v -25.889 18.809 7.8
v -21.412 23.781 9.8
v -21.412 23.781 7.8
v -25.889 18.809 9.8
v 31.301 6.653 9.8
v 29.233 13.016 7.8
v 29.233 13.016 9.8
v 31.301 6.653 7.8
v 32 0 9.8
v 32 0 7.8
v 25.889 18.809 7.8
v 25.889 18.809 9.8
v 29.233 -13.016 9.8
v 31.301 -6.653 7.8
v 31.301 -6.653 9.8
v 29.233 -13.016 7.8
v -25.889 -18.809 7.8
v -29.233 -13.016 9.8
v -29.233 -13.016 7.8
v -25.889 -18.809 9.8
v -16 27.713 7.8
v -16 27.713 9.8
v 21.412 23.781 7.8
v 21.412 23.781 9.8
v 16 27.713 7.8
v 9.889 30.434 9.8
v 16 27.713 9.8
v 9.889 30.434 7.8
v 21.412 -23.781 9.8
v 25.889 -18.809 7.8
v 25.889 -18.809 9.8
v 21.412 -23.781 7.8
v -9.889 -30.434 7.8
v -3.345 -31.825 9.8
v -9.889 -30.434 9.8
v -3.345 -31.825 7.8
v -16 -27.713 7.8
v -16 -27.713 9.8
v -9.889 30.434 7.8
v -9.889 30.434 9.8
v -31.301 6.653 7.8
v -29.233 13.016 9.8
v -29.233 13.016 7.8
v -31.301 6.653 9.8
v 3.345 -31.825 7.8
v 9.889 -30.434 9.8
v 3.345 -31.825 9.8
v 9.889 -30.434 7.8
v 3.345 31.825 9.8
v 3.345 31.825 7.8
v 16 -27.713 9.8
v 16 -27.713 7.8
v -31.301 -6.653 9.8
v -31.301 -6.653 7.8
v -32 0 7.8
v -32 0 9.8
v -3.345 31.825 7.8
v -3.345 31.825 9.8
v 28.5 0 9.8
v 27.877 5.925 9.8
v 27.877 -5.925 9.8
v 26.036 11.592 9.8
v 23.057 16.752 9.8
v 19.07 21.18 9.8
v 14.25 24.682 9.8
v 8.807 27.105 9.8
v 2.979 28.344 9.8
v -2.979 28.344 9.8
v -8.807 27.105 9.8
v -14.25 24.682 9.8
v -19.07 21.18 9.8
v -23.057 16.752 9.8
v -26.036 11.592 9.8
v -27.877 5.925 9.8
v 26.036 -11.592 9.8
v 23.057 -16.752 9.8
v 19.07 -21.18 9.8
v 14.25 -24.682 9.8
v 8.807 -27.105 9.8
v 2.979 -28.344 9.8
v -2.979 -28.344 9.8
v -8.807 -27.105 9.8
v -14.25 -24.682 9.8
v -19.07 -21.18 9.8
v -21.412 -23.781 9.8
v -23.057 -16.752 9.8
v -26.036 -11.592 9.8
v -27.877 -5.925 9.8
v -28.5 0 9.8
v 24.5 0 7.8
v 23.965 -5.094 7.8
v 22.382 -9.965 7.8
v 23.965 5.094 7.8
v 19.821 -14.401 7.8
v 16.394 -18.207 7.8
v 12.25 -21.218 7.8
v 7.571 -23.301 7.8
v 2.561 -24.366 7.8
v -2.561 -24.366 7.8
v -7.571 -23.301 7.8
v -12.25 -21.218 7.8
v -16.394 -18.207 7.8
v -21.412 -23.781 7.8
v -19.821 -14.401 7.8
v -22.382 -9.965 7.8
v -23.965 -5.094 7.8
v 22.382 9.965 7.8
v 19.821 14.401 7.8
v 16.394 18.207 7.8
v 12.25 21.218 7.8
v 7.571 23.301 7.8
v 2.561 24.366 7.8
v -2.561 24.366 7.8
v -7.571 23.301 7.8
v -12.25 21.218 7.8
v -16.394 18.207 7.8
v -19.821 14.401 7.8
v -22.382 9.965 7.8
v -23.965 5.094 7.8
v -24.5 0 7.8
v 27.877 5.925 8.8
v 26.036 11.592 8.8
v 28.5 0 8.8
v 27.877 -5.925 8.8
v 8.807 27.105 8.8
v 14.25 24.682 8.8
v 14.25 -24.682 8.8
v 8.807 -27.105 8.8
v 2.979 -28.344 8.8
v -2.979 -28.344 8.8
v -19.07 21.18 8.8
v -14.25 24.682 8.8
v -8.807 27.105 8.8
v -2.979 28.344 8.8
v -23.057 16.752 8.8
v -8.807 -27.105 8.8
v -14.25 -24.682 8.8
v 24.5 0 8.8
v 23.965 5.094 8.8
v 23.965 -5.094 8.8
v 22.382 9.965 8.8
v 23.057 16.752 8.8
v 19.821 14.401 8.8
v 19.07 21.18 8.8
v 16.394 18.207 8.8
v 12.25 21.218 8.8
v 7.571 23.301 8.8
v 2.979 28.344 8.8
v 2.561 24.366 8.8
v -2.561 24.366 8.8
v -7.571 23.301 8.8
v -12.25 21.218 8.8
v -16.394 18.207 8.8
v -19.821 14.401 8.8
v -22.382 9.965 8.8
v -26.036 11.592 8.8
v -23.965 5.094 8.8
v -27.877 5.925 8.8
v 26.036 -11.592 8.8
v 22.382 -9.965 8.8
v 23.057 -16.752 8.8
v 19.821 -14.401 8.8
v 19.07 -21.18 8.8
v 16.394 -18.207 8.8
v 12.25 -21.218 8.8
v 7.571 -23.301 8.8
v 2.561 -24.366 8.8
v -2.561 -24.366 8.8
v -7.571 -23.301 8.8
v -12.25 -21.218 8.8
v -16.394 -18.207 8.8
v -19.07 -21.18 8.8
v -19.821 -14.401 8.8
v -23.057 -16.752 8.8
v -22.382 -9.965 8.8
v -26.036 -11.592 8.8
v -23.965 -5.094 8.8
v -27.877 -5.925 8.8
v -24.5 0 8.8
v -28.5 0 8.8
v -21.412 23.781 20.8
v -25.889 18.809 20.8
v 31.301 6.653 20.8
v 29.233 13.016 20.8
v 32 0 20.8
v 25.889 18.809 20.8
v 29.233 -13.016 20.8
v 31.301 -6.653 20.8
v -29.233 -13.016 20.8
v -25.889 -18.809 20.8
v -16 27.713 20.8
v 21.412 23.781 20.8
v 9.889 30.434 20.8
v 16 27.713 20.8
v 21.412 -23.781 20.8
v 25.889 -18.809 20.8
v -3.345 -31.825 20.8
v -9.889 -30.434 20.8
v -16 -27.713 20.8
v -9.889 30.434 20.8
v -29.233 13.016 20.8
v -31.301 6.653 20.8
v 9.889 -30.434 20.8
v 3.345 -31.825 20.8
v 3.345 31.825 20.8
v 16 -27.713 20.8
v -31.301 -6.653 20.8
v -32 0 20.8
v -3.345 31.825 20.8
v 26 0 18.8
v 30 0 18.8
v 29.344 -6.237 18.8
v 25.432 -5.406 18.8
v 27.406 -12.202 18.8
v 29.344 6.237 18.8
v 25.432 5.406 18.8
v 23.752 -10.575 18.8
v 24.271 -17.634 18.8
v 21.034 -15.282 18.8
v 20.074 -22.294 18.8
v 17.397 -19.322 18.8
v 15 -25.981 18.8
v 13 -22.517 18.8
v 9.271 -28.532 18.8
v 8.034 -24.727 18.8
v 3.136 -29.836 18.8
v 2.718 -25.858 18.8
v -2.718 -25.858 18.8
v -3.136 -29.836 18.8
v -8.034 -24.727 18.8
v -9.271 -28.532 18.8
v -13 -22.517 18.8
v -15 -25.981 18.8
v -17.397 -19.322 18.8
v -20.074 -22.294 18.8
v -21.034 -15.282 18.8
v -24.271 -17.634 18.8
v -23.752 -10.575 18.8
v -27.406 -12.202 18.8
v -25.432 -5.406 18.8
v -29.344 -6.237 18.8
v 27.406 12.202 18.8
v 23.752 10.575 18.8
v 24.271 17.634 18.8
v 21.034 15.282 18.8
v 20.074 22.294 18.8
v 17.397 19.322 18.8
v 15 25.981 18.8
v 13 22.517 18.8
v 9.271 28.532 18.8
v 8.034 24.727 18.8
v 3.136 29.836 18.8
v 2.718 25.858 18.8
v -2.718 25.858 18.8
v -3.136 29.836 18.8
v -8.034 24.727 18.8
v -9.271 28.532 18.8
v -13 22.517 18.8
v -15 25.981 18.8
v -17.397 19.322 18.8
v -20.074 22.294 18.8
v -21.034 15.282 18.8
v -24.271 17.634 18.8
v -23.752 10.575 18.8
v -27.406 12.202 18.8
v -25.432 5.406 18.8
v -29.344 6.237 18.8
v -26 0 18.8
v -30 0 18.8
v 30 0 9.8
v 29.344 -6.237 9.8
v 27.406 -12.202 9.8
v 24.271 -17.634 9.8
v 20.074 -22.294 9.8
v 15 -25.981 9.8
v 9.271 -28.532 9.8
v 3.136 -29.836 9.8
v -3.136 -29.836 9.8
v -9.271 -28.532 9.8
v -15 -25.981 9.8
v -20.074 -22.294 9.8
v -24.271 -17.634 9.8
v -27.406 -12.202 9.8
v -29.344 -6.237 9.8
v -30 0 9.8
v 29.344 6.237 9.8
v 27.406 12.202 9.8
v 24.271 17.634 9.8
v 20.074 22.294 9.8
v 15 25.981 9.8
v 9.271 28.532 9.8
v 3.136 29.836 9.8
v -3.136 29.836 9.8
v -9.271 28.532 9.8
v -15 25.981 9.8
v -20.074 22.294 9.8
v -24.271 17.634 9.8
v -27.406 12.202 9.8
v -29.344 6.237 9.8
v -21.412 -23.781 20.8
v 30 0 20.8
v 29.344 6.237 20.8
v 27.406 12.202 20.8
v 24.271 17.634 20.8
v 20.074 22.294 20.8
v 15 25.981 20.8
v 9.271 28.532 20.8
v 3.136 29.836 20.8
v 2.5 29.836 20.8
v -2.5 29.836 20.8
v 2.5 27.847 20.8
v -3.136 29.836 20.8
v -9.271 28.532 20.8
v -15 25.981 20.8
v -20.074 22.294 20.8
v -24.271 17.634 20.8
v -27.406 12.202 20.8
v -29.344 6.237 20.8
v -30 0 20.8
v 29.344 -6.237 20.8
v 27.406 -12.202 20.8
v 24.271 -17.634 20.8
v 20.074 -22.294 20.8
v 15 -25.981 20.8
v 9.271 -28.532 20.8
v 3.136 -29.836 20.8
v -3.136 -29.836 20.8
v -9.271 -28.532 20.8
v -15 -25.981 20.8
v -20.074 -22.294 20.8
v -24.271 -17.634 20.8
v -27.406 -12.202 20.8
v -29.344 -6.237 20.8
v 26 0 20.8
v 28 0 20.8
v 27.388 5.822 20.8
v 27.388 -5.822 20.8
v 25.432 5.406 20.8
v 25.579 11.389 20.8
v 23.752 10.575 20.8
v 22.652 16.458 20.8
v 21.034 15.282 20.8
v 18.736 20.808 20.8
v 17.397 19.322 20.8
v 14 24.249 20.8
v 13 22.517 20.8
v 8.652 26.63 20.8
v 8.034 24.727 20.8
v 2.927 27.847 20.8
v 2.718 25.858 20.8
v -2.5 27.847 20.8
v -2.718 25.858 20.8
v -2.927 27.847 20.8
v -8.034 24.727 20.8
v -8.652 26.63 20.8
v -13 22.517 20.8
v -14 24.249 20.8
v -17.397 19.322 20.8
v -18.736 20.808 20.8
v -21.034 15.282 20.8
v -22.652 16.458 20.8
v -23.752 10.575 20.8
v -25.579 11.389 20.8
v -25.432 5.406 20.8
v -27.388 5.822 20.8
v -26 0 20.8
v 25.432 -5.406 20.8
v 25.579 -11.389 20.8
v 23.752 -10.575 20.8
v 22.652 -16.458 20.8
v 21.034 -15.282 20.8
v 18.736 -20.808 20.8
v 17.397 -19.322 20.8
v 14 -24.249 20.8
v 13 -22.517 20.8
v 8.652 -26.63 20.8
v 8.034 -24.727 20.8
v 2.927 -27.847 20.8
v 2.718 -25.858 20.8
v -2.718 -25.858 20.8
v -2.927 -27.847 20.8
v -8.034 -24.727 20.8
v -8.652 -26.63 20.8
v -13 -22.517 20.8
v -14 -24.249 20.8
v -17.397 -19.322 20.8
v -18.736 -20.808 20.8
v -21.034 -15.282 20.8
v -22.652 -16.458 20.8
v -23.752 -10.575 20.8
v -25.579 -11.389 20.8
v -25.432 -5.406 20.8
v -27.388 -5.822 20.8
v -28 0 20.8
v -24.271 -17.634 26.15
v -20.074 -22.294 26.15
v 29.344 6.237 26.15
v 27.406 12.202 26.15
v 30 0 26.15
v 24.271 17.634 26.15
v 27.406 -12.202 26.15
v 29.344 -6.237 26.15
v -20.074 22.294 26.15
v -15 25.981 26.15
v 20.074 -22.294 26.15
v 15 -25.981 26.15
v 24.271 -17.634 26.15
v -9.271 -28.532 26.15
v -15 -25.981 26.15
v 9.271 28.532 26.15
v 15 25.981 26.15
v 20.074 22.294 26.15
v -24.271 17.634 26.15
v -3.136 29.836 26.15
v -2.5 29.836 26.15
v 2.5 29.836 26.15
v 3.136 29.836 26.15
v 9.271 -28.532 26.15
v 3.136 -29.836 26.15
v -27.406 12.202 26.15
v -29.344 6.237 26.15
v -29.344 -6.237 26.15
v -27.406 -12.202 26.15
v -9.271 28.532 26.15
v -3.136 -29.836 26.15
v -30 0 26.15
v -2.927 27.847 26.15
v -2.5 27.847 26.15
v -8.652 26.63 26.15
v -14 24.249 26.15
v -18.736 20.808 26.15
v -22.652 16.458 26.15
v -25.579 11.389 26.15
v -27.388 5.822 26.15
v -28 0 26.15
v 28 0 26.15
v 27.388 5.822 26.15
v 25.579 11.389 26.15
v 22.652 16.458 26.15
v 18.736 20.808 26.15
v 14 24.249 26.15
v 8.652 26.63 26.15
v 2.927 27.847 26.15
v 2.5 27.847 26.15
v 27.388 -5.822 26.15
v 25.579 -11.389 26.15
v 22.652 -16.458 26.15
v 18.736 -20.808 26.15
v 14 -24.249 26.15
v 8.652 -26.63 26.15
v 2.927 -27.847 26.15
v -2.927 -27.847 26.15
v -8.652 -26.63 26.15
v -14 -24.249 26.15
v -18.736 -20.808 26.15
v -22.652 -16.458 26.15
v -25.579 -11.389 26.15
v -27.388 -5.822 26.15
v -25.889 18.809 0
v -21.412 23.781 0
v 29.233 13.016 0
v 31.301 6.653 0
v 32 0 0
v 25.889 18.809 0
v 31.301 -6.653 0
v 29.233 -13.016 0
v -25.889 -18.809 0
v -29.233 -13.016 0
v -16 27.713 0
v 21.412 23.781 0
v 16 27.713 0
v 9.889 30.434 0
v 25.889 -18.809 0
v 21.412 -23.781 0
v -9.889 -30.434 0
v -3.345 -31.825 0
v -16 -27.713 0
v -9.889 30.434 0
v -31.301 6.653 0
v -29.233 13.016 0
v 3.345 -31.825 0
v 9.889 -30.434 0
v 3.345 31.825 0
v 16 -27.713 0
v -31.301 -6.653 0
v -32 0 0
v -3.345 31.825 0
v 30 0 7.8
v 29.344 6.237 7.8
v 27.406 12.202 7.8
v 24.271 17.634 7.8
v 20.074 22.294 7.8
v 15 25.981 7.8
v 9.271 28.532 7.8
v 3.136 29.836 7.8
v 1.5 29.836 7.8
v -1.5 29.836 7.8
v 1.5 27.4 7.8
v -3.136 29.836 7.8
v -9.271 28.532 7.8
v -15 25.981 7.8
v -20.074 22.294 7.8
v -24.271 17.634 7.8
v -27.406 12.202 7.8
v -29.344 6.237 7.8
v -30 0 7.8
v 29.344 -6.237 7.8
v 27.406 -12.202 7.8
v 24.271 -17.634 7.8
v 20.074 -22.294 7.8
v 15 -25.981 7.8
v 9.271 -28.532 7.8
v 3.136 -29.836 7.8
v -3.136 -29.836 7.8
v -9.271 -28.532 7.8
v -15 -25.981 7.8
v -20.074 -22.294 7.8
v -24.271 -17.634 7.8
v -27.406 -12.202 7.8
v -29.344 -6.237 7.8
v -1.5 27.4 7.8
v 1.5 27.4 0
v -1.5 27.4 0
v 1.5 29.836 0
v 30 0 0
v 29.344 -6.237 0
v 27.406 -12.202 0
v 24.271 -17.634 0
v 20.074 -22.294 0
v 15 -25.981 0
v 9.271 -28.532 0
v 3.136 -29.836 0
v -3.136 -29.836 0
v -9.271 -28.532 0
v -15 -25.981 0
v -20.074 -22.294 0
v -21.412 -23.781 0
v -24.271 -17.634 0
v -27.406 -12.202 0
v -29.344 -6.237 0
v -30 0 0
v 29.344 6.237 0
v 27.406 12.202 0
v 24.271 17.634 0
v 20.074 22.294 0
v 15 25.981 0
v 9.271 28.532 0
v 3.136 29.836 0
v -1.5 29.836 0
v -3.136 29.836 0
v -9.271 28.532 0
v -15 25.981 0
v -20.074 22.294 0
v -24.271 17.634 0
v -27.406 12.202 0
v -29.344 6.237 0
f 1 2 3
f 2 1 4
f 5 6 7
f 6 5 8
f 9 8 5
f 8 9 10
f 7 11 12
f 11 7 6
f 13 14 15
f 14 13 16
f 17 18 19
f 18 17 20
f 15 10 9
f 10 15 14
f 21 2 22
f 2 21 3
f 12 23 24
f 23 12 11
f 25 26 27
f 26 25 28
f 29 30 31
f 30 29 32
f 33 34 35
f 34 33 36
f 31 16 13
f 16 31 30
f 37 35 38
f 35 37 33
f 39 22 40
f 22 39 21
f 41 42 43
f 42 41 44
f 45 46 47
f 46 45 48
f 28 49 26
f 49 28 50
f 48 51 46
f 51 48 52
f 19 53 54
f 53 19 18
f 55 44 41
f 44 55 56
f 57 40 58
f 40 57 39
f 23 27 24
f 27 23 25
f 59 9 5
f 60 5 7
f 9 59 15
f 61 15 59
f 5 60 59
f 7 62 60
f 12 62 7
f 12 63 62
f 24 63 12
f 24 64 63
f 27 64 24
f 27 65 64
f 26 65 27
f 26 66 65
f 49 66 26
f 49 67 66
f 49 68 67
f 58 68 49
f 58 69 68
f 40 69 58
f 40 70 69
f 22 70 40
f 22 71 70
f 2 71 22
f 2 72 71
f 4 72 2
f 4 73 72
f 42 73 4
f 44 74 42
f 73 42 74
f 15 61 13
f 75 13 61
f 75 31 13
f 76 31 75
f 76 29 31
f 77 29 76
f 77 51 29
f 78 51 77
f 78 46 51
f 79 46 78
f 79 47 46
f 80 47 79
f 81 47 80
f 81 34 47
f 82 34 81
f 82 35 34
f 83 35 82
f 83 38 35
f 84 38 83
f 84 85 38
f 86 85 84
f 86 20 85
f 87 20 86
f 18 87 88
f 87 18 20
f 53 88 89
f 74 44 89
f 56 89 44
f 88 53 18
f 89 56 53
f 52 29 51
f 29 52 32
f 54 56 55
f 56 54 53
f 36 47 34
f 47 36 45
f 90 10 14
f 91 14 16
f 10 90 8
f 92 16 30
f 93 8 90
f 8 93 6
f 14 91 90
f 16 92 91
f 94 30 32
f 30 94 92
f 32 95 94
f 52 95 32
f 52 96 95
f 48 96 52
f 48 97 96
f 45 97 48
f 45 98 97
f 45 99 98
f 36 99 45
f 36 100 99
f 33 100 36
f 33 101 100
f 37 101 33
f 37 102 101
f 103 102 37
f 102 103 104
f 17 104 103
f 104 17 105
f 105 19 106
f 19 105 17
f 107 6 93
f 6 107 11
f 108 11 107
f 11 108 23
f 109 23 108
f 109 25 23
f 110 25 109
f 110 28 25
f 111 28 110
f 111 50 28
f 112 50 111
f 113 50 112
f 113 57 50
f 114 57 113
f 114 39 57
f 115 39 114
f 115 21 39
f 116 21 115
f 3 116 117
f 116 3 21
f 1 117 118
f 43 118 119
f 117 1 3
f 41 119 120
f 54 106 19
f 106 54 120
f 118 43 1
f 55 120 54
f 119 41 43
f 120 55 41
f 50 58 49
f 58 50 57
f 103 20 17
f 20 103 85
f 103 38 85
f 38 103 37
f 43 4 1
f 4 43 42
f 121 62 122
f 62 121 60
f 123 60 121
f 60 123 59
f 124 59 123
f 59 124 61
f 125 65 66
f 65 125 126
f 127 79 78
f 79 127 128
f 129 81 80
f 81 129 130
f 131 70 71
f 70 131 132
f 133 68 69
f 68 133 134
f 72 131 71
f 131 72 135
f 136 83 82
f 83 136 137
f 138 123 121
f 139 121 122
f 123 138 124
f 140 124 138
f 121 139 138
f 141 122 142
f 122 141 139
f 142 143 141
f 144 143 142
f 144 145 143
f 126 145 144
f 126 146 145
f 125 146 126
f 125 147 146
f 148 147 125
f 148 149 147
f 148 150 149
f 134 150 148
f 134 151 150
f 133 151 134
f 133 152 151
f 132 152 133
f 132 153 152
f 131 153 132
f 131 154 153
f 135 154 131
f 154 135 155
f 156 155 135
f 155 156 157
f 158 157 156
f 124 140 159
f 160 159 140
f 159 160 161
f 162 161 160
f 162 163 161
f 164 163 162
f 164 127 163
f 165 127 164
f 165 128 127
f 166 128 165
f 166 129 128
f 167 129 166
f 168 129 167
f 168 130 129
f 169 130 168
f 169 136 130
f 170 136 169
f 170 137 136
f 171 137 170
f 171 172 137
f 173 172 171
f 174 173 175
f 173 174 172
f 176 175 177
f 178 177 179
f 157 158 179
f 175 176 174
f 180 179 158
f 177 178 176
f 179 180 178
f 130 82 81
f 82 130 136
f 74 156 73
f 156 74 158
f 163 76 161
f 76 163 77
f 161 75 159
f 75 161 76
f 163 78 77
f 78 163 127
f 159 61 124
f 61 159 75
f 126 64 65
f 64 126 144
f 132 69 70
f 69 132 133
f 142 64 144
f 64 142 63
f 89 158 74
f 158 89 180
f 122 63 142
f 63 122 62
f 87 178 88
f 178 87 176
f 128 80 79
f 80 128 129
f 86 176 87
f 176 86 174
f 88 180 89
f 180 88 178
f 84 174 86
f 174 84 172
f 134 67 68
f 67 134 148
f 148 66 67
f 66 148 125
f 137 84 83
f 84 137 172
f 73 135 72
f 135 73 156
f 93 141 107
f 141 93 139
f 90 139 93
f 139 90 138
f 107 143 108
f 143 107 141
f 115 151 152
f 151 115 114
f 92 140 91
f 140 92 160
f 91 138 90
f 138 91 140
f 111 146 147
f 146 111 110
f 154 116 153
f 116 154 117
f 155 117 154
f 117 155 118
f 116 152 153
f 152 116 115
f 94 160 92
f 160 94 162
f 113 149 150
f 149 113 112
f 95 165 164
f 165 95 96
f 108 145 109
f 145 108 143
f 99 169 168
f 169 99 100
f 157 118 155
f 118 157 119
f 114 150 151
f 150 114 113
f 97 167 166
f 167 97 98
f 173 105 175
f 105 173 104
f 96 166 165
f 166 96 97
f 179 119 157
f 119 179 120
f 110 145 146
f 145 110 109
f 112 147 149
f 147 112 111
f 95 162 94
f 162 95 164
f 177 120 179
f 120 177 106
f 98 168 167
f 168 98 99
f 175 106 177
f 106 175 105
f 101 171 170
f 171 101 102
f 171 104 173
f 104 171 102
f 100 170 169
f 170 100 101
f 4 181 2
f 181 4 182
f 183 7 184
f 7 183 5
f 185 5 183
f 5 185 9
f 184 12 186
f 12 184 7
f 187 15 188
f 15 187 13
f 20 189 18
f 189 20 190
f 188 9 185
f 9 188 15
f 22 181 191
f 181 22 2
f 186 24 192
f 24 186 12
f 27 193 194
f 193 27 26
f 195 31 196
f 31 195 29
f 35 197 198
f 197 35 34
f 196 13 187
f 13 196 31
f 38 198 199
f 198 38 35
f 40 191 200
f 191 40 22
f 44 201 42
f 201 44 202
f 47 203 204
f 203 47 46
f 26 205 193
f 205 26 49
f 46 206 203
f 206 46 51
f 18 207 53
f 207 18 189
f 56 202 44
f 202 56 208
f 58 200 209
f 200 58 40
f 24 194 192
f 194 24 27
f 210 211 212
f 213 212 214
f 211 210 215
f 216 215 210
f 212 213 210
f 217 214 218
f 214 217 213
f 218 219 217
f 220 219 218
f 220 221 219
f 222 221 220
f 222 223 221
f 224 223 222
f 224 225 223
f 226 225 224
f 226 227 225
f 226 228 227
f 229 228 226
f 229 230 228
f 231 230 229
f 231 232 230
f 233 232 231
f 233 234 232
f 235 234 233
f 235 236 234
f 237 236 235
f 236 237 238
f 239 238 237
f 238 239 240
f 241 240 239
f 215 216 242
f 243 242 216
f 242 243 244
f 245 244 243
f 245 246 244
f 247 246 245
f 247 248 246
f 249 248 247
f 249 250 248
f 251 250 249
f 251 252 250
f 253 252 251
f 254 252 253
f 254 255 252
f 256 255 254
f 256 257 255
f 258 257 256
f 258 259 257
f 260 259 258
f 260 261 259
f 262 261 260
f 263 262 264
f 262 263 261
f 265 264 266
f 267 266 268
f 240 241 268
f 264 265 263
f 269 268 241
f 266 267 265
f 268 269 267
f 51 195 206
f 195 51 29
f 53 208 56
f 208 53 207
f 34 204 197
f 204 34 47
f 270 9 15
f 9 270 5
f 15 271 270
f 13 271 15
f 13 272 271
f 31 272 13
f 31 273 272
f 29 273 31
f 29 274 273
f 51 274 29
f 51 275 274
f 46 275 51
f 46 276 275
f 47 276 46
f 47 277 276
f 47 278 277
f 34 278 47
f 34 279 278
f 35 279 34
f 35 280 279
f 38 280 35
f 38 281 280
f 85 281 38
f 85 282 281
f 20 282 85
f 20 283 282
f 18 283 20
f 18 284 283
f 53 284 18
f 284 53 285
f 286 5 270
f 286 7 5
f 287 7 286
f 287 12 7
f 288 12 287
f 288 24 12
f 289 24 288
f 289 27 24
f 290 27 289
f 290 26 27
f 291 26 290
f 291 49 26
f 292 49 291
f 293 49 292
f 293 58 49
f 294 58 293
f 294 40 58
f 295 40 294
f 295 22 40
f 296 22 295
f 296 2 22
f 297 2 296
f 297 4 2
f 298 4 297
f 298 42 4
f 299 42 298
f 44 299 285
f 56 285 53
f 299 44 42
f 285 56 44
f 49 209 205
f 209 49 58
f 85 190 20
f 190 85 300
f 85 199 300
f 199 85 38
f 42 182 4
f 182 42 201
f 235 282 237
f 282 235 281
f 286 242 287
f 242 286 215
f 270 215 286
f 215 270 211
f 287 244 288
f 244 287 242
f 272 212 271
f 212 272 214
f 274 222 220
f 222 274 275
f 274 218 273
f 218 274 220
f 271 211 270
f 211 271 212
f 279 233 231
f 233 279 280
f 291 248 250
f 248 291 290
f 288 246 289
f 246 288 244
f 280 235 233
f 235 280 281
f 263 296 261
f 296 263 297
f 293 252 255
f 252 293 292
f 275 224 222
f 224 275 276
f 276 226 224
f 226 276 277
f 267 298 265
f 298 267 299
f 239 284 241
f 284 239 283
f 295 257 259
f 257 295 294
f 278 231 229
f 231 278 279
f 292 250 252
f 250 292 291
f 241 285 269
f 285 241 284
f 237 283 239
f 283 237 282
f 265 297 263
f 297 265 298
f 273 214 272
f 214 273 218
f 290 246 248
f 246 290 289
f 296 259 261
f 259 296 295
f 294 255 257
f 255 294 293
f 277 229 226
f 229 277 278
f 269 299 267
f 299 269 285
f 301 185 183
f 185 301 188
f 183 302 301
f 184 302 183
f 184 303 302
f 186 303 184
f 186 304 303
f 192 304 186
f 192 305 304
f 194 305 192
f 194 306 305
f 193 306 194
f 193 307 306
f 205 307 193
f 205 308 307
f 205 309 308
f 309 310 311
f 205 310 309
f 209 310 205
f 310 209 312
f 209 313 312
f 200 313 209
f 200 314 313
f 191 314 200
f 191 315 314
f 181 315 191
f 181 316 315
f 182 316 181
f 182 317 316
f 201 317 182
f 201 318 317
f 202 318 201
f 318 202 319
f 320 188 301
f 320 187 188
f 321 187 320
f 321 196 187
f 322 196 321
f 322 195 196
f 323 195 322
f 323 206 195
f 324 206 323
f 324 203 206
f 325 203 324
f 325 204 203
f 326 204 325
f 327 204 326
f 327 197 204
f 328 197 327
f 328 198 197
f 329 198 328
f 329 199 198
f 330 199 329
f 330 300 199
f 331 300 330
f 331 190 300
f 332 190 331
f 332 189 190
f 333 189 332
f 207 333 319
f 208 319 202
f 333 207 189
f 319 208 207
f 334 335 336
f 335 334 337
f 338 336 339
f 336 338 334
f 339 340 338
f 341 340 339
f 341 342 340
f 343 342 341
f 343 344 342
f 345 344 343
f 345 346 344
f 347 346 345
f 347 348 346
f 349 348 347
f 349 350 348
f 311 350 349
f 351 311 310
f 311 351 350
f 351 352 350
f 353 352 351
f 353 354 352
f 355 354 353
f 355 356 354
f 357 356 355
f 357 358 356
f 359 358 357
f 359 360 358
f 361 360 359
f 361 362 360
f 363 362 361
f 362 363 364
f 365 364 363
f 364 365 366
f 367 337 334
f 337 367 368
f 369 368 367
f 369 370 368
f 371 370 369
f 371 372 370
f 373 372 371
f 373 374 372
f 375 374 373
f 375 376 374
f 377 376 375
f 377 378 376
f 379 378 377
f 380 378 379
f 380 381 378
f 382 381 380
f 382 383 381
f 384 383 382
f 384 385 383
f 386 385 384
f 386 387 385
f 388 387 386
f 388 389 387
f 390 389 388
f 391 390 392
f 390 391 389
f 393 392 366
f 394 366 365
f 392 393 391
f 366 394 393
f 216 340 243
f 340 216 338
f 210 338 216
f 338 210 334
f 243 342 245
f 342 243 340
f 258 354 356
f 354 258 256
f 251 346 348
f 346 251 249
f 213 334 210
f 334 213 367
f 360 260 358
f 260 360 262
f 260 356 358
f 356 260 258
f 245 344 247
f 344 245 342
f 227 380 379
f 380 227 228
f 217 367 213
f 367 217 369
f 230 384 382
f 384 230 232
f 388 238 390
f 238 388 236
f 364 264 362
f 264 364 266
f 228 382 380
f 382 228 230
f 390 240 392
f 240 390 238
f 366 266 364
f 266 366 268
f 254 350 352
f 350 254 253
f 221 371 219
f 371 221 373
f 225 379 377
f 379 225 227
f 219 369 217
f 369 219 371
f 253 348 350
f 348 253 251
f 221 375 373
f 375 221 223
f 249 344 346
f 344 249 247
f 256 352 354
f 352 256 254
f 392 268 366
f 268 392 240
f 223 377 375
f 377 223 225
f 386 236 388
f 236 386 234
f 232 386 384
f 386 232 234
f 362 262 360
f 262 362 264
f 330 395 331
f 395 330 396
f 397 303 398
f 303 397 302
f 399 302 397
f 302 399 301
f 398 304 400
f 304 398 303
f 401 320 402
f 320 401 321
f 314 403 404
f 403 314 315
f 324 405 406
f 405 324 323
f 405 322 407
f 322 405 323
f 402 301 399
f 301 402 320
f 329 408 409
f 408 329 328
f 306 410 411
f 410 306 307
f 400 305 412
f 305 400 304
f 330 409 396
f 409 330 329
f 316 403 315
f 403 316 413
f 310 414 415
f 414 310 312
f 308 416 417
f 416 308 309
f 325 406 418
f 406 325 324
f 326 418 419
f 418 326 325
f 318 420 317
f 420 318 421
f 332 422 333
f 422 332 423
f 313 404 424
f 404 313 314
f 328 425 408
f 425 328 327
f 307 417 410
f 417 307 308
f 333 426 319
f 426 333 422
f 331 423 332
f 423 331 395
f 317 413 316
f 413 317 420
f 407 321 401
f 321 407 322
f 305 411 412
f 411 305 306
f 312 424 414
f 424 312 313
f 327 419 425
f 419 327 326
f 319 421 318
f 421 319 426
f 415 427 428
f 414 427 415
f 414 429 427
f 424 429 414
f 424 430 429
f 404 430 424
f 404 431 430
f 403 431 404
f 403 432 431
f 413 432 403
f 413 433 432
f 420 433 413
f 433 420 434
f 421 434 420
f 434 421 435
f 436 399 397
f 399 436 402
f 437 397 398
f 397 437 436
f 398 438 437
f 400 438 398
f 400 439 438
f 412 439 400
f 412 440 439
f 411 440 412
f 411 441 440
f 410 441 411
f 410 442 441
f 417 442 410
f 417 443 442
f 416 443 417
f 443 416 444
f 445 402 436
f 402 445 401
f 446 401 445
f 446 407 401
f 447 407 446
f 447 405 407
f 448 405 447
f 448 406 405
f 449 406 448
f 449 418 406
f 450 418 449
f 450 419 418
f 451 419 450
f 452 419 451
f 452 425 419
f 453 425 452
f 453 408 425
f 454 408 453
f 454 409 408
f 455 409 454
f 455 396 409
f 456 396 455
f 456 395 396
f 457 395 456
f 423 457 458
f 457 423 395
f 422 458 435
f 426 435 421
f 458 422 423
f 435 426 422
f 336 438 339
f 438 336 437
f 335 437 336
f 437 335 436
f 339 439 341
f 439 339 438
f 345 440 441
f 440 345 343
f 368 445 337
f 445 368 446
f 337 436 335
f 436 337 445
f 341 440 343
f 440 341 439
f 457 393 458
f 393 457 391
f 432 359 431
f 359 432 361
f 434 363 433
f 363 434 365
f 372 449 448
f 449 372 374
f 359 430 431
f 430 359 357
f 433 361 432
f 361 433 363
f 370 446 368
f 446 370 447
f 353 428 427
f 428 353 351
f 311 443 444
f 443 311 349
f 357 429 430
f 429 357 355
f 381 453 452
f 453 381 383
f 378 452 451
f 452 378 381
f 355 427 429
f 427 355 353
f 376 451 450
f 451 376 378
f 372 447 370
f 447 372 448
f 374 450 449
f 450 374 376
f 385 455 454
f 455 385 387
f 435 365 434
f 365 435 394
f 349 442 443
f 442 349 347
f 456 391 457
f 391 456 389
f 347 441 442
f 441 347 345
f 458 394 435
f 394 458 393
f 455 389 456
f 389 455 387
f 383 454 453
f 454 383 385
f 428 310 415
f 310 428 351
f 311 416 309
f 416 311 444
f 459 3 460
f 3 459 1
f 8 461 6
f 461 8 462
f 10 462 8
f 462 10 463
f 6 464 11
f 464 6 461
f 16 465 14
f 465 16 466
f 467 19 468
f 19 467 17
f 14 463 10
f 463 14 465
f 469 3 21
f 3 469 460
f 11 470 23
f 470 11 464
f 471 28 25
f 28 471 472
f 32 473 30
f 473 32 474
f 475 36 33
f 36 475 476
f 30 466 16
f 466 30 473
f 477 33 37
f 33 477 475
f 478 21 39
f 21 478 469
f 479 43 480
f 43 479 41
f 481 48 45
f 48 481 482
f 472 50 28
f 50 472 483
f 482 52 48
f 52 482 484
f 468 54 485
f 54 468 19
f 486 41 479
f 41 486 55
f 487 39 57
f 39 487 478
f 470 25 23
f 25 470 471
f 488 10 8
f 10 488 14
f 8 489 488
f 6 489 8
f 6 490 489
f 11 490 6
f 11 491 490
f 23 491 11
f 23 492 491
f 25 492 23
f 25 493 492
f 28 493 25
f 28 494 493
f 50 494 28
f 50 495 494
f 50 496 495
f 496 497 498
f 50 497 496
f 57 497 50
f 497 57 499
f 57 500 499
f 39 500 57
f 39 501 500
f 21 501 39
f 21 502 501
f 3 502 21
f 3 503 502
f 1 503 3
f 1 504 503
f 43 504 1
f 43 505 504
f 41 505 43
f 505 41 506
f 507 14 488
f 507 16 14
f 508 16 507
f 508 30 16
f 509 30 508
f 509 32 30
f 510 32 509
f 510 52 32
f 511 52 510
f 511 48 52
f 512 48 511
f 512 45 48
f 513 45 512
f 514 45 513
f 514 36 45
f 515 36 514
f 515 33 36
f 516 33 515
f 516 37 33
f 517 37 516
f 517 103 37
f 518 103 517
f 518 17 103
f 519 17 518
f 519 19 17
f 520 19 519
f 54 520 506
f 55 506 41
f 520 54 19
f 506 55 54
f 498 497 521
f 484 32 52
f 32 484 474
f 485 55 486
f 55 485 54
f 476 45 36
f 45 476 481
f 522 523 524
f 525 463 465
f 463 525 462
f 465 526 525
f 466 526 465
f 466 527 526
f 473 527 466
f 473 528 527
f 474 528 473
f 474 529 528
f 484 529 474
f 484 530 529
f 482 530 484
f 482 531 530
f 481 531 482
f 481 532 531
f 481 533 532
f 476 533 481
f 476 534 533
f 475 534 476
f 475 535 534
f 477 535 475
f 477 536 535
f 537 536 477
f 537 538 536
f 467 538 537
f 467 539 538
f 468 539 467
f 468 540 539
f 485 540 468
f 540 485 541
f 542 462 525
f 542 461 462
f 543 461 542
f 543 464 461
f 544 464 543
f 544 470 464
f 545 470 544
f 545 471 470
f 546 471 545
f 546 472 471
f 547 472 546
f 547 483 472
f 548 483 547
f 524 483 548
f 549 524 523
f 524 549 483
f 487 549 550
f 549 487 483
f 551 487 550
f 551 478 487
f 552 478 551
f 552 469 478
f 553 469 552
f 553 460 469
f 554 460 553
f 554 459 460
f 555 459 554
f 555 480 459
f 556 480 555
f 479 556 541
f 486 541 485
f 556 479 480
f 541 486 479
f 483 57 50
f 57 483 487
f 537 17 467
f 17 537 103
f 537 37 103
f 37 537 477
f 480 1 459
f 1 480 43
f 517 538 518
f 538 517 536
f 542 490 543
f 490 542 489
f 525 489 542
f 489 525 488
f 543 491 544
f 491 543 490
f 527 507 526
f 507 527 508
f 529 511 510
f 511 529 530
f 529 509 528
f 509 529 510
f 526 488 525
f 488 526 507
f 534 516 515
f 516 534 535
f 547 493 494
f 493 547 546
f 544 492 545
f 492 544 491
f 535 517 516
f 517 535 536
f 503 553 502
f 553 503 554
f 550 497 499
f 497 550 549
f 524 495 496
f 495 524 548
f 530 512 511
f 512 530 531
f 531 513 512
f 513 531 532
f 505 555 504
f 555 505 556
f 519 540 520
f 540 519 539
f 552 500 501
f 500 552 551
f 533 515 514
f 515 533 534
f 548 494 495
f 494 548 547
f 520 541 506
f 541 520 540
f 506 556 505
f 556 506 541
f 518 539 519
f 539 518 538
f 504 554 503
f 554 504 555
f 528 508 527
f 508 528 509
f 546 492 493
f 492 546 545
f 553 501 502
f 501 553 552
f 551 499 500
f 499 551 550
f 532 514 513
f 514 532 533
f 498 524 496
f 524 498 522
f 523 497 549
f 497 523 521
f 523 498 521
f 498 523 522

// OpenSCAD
// file: settingsLenghts.scad
//Ancho de la pared
pared  = 2;
//Radio del centro hueco
radioC = 11;
//Alto de la capa de apertura
aperH = 5.5;
//Ancho de la apertura
aperW = 5+1.1;//Ancho mas holgura
//Ancho del lente macro
macroW = 9.3;
//Profundidad del macro
macroH = 3;
//Profundidad parte de atras y delante
profDelante = 6;
profAtras = 6;
//Ceja entre uniones de cilindros
cejaH = 6;
guiaParedW = 2;
tmpHolg = 1.8;


//Correcc

//
//CÁMARA
camP = 3;//Grueso de la pared del presente modelo
camW = 105;//Ancho de la cámara
camH = 61;//Alto de la cámara
camD = 23.5;//Profundidad de la cámara
camHlg = 6;//Holgura que se deja para los tornillos
camLW = 57/2;//Radio del exterior del lente
torW  = 2;//Radio

//
//Ancho de tubo principal (grande)
mcW = 32;//radio
mcH = 28;

//Dimensiones del difractador
diffW = 51;//Alto y Ancho
diffD=1;//Profundidad del difractador
diffWinW=36;//Ancho de la ventana de difracción
diffWinH=24;//Alto de la ventana de difracción

//
//Adquisición de luz
luzHBig = 10; //donde va el tornillo
luzWBig = 28; //27:diametro donde va el tornillo
luzHBigT = 4; //alto del tornillo
luzWBigT = 6; //6: ancho del tornillo
luzHRosca = 7; //donde va la rosca
luzWRosca = 23; //22:diametro de donde va la rosca



//Cuadro guia para que no se mueva
guiaH = cejaH;
guiaW = 3;



module creaPared(h){
	difference(){
		//Pone el cilindro principal
		cylinder(r=mcW,h);

		//Le quita el contorno exterior
		translate([0,0,-0.1])
		cylinder(r=mcW-pared,h+0.2);
	}
}
module creaGuiaTornilloCentrada(){
	translate([-luzWBigT/2,-luzWBigT/2,0])
	cube([luzWBigT,luzWBigT,luzHBig-1+0.2]);
}
module creaGuiaTornilloCentradaArea(){
	tmpW = luzWBigT + pared;
	tmpH = luzHBig  + pared;
	translate([-tmpW/2,-tmpW/2,0])
	cube([tmpW,tmpW,tmpH]);
}
module creaGuia(h){
	//Pone el circulo soporte
	difference(){
		cylinder(r=mcW,h);
		translate([0,0,-0.1])
		cylinder(r=mcW-pared,h+0.2);
	}
	//Pone la guia1
	translate([0,mcW-pared-(guiaW/2)+0.4,0])
	creaGuiaCentrada(h);
}
module creaGuiaHembra(h){
	//Pone el circulo soporte
	tmpW = mcW-guiaW;	
	creaPared(sopH);
	sopH = 1.35;
	
	//Pone la pared de la guia
	difference(){
		cylinder(r=(mcW-pared),sopH+h);
		translate([0,0,-0.1])
		cylinder(r=(mcW-pared-guiaParedW),sopH+h+0.2);
		//Pone la guia
		translate([-(guiaW/3),tmpW,sopH])
		creaGuiaCentrada(sopH+h+0.2);
		translate([(guiaW/3),tmpW,sopH])
		creaGuiaCentrada(sopH+h+0.2);
	}
}
module creaGuiaCentrada(h){
	translate([-guiaW/2,-guiaW/2,0])
	cube([guiaW,guiaW,h]);
}
// main file
include <settingsLenghts.scad>


/////////////////////////////////////

// Cuanto se deja entre la tapa auxiliar y la planta alta
tmpHolg = 1.8;
macBaseW = 49/2; //radio interno del macro
macContW = 57/2; // radio del contorno del macro
macBaseH = 9; // alto del macro
macTapaW = 52/2; // radio de la tapa

//Pone la base del macro
translate([0,0,cejaH+tmpHolg])
creaBaseMacro();

//Pone la pared de la tapa
translate([0,0,cejaH+pared+tmpHolg])
creaPared(macBaseH);

//Pone la tapa del macro
translate([0,0,cejaH+tmpHolg+macBaseH+pared])
creaTapaMacro(macBaseH);

//Pone la guia hembra
translate([0,0,cejaH+pared+tmpHolg+macBaseH])
creaGuiaHembra(cejaH);

//Pone guia macho
creaGuia(cejaH+tmpHolg);


module creaPared(h){
	difference(){
		//Pone el cilindro principal
		cylinder(r=mcW,h);

		//Le quita el contorno exterior
		translate([0,0,-0.1])
		cylinder(r=mcW-pared,h+0.2);
	}
}

module creaTapaMacro(){
	difference(){
		//Pone el cilindro principal
		cylinder(r=mcW,pared);
		//Le quita el contorno exterior
		translate([0,0,-0.1])
		cylinder(r=macTapaW,pared+0.2);
	}
}

module creaBaseMacro(){
	difference(){
		//Pone el cilindro principal
		cylinder(r=mcW,pared);

		//Le quita el contorno exterior
		translate([0,0,pared/2])
		cylinder(r=macContW,pared);

		//Le quita la apertura
		translate([0,0,-0.1])
		cylinder(r=macBaseW,pared);
	}
}
